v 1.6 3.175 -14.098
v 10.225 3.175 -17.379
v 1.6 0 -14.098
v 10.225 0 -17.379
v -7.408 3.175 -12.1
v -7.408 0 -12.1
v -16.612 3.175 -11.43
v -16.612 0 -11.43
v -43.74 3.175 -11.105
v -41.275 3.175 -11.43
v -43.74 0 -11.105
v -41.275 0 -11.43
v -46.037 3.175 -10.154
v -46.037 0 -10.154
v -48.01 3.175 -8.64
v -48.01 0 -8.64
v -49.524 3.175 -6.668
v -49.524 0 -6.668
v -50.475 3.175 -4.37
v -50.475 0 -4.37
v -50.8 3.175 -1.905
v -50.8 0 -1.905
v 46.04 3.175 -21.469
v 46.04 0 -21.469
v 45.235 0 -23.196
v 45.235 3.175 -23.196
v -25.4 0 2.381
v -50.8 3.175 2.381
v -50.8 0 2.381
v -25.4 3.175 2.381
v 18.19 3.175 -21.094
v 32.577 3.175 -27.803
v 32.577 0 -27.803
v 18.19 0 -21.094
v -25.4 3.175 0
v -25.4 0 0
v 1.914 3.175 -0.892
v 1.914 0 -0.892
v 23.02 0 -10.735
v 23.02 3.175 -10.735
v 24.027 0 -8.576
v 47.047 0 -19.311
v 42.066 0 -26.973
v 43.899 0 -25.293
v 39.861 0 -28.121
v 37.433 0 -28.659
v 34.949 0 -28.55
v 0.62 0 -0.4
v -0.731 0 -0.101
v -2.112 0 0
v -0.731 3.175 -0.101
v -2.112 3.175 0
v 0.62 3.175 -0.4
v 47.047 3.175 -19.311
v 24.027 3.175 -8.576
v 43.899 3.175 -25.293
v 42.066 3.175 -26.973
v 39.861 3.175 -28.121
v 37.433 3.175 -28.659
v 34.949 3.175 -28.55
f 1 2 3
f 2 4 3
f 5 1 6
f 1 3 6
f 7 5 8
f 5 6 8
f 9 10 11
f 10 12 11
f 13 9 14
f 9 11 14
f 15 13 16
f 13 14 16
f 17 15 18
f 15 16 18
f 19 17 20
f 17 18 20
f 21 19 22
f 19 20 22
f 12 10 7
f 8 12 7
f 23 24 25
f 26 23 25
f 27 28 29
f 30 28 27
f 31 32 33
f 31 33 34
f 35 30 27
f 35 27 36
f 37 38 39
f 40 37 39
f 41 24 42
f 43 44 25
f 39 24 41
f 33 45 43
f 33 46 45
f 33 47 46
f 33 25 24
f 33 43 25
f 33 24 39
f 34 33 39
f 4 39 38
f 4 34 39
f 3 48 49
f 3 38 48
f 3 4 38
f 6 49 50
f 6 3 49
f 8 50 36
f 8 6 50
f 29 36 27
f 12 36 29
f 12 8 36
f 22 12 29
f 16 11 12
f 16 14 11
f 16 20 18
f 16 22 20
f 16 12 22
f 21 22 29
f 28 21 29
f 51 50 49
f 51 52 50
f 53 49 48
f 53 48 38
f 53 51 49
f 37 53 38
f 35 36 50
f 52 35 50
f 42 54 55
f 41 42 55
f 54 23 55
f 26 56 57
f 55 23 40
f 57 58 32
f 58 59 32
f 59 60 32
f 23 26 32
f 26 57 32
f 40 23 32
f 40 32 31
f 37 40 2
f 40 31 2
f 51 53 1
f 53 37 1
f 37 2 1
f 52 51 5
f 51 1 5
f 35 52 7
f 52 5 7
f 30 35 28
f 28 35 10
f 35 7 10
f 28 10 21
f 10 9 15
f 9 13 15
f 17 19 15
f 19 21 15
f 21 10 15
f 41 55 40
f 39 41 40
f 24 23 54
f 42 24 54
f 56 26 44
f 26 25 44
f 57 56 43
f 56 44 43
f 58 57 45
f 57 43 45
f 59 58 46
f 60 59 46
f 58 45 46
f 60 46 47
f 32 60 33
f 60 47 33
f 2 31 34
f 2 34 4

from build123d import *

# Parameters (mm, degrees)
BOSS_EXTRUDE1_DEPTH = 3.175
SKETCH2_W           = 25.4
SKETCH2_H           = 2.38125
BOSS_EXTRUDE2_DEPTH = 3.175
CUT_EXTRUDE1_DEPTH  = 4.175
FILLET1_R           = 9.525
FILLET2_R           = 63.5


with BuildPart() as part:
    # Sketch1 → Boss-Extrude1 (new body)
    with BuildSketch(Plane(origin=(0, 0, 0), x_dir=(1, 0, 0), z_dir=(0, 1, 0))):
        Polygon((-50.8, 0), (0, 0), (46.040435581, 21.469007696), (40.673183657, 32.979116592), (-50.8, 12.7), align=None)
    extrude(amount=BOSS_EXTRUDE1_DEPTH)

    # Sketch2 → Boss-Extrude2 (add)
    with BuildSketch(Plane(origin=(0, 3.175, 0), x_dir=(1, 0, 0), z_dir=(0, 1, 0))):
        Polygon((23.020217791, 10.734503848), (46.040435581, 21.469007696), (47.046795317, 19.310862279), (24.026577527, 8.57635843), align=None)
        with Locations((-38.1, -1.190625)):
            Rectangle(SKETCH2_W, SKETCH2_H)
    extrude(amount=-BOSS_EXTRUDE2_DEPTH)

    # Sketch3 → Cut-Extrude1 (cut, through all)
    with BuildSketch(Plane(origin=(0, 3.175, 0), x_dir=(1, 0, 0), z_dir=(0, 1, 0))):
        Polygon((-25.4, 11.43), (-50.8, 11.43), (-50.8, 12.7), (40.673183657, 32.979116592), (41.20990885, 31.828105702), (18.189691059, 21.093601854), (-2.533969994, 11.43), align=None)
    extrude(amount=-CUT_EXTRUDE1_DEPTH, mode=Mode.SUBTRACT)

    # Fillet1
    fillet1_edges = [part.edges().sort_by_distance(p)[0] for p in [
        (0, 1.5875, 0),
        (41.20990885, 1.5875, -31.828105702),
        (-50.8, 1.5875, -11.43),
    ]]
    fillet(fillet1_edges, radius=FILLET1_R)

    # Fillet2
    fillet2_edges = [part.edges().sort_by_distance(p)[0] for p in [
        (-2.533969994, 1.5875, -11.43),
    ]]
    fillet(fillet2_edges, radius=FILLET2_R)


solid = part.part
